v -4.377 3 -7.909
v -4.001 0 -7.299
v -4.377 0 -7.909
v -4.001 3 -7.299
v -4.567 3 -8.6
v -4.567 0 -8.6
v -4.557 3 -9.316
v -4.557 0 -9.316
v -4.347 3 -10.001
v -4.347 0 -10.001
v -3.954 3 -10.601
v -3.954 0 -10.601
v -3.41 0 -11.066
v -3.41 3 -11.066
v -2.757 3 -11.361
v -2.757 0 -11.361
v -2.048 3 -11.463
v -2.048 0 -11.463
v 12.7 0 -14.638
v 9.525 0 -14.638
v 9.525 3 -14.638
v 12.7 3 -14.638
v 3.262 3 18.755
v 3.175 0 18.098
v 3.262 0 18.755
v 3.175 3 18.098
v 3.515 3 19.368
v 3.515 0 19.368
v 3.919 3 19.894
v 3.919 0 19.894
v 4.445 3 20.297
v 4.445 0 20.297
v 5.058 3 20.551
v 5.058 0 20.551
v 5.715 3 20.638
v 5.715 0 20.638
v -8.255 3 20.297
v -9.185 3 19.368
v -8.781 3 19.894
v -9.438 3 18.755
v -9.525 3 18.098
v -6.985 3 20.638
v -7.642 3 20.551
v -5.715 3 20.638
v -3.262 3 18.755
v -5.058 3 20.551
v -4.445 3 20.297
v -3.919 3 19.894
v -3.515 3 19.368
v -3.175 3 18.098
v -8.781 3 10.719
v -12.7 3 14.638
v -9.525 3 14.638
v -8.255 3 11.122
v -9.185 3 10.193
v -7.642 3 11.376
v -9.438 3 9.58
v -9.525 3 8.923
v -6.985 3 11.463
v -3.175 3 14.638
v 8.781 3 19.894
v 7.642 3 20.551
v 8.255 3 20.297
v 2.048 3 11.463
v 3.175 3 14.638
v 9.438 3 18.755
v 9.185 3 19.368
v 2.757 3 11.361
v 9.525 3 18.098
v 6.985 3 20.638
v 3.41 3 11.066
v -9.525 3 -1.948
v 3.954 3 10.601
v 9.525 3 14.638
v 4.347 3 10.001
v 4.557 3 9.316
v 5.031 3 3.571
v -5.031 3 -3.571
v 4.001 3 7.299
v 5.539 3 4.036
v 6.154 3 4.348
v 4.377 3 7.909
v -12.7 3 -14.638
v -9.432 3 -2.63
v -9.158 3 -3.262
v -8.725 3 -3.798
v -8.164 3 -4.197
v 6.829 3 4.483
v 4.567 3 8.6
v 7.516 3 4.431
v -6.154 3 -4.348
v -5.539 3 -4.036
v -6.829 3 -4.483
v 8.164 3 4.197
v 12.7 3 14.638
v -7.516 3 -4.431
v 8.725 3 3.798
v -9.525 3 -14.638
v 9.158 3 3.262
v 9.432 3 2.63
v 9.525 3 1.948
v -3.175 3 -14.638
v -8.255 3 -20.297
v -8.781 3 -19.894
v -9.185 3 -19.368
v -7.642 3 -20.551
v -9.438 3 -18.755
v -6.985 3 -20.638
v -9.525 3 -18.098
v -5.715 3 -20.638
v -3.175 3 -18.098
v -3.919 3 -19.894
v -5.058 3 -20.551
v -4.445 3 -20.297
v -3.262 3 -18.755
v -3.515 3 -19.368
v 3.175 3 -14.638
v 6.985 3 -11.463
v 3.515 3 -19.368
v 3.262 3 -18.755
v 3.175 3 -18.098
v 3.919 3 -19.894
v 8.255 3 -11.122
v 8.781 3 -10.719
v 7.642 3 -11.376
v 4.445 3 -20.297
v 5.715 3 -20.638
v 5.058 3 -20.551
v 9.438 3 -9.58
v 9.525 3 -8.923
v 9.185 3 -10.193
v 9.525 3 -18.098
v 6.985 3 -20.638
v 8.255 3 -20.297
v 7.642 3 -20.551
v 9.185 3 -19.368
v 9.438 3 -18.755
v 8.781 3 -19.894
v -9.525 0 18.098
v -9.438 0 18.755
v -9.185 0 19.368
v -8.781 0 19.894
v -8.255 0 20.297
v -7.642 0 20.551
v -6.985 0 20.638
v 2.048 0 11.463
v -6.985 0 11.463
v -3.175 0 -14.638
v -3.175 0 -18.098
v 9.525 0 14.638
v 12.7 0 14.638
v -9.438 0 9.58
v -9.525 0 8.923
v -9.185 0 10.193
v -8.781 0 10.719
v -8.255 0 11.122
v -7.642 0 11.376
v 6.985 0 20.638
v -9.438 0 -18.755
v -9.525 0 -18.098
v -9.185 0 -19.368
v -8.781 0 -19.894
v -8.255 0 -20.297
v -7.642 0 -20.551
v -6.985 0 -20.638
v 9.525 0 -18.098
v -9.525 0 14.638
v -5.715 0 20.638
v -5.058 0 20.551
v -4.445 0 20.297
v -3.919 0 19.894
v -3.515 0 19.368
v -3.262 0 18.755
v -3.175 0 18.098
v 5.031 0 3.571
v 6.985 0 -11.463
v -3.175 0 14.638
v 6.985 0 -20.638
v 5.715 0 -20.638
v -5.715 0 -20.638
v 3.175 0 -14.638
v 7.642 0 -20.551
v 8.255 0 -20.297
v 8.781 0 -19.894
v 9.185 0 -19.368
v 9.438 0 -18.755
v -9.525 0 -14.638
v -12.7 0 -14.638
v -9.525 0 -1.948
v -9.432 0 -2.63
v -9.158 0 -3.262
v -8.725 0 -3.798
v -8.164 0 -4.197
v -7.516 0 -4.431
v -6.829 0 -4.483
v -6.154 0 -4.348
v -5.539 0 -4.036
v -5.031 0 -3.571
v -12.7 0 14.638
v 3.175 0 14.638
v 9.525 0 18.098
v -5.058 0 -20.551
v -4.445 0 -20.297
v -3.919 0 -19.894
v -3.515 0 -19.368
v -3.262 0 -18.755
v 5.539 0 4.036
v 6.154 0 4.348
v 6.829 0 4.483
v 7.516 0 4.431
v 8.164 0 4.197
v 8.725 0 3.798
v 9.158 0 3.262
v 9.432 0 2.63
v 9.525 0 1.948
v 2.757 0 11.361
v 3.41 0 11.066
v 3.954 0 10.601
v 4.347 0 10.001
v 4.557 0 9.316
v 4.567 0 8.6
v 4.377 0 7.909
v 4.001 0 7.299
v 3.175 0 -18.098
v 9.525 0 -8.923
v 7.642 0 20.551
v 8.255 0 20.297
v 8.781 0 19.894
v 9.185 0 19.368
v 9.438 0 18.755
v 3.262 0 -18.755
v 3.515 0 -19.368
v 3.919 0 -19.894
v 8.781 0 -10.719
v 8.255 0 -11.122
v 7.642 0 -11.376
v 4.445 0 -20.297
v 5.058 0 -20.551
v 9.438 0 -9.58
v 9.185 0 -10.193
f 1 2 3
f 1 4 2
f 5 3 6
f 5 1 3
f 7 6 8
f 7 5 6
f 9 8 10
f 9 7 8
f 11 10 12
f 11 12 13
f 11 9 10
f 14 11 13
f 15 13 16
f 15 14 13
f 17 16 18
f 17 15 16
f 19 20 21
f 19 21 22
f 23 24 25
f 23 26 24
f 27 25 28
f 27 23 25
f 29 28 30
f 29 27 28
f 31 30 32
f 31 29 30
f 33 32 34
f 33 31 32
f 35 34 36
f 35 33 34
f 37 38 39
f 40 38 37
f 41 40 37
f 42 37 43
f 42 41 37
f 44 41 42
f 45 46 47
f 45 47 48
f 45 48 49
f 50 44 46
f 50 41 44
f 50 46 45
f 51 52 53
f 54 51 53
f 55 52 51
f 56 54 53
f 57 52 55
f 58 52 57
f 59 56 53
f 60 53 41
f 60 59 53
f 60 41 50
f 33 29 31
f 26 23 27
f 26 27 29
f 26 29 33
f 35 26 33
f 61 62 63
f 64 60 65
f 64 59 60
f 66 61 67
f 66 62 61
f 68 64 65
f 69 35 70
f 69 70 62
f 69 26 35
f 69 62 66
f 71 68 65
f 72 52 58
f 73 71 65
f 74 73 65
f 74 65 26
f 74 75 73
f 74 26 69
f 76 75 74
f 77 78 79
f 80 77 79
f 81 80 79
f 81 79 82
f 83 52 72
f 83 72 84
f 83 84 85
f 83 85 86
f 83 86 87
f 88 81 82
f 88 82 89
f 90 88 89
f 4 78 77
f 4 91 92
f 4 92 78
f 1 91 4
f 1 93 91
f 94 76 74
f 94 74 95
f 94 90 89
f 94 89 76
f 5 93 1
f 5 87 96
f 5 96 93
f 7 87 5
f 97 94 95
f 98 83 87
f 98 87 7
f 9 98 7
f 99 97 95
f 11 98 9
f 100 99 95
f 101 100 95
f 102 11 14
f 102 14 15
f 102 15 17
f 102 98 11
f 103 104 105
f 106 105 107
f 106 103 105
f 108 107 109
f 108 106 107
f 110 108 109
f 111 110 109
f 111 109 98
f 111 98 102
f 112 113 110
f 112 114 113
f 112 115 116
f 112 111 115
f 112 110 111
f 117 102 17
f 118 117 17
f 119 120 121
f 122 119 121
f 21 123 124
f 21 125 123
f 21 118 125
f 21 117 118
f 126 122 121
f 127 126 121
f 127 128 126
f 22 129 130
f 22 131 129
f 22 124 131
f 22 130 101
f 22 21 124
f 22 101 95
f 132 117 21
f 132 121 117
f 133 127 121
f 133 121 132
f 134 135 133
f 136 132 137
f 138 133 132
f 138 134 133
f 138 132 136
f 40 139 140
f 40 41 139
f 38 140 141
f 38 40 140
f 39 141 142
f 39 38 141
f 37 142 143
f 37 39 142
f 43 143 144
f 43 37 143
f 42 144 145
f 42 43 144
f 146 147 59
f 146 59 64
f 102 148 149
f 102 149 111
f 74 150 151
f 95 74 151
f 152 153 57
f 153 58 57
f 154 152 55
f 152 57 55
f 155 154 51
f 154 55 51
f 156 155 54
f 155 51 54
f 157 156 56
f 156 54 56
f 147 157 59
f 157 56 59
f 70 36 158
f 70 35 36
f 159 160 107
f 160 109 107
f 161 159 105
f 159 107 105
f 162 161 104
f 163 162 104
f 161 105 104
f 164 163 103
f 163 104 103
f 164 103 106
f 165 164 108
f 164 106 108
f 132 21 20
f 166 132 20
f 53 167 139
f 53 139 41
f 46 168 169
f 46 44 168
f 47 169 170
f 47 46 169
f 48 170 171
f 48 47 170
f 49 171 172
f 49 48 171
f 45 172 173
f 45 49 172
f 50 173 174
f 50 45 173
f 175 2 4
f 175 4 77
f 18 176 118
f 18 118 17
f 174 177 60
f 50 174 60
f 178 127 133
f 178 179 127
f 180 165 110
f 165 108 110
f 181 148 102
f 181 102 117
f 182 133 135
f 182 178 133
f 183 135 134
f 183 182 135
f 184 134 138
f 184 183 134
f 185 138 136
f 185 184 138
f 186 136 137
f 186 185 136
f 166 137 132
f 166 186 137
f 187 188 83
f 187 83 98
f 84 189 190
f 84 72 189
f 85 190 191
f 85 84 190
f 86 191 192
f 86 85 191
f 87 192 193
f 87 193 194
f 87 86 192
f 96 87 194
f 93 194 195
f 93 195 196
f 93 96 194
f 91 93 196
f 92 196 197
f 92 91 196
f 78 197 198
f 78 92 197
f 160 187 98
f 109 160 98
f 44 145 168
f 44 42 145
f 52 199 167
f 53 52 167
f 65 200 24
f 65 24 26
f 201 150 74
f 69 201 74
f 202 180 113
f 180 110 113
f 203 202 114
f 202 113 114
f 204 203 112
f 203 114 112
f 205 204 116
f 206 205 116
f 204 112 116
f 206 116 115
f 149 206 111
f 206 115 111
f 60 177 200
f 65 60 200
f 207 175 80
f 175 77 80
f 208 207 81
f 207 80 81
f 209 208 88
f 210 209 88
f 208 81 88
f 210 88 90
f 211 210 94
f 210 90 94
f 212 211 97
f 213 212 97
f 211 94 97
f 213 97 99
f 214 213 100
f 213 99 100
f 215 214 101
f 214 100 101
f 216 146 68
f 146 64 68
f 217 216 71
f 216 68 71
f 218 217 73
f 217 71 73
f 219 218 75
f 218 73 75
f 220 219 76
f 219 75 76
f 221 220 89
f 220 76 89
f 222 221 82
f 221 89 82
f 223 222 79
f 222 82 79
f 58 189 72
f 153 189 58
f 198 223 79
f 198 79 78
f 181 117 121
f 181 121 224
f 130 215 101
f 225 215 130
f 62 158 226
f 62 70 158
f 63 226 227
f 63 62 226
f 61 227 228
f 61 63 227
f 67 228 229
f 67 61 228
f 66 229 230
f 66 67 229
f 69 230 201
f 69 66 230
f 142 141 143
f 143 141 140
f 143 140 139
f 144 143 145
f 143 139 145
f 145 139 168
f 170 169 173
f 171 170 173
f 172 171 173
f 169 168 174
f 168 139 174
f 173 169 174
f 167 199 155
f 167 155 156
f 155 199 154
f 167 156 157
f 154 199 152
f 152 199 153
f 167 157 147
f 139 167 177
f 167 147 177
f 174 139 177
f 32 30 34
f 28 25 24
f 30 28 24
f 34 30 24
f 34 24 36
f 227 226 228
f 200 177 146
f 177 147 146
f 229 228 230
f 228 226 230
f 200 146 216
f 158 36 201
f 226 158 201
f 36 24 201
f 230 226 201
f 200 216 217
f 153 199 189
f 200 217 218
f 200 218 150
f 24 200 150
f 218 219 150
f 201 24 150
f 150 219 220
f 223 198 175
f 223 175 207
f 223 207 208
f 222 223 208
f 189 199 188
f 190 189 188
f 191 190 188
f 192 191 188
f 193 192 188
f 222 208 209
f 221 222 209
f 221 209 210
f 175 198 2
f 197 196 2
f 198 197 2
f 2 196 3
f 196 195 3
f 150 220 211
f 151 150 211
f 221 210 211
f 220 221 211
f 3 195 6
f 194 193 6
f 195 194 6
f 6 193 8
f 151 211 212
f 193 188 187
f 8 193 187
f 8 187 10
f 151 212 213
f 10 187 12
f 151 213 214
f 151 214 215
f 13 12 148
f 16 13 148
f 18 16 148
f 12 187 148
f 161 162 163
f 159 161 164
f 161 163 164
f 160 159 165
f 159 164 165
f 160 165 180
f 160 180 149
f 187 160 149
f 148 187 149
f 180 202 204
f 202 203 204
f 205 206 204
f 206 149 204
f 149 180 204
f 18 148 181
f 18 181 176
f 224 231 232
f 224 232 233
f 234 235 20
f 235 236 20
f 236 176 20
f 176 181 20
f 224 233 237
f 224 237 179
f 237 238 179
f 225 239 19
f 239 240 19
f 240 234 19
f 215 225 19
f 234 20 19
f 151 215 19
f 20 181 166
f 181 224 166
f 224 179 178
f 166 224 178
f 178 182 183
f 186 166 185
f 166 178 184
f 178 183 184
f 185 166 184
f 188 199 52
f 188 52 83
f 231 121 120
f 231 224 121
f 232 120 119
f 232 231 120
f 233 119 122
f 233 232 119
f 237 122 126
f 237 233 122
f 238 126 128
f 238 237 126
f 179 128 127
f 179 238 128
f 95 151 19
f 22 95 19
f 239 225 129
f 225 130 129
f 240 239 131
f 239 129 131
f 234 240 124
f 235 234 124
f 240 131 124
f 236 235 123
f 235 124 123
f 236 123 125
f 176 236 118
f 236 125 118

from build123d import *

# Parameters (mm, degrees)
SKETCH1_W               = 25.4
SKETCH1_H               = 29.275000124
BOSS_EXTRUDE1_DEPTH     = 3
SKETCH2_W               = 6.35
SKETCH2_H               = 3
BOSS_EXTRUDE2_DEPTH     = 6
LPATTERN1_COUNT         = 2
LPATTERN1_PITCH         = 12.7
MIRROR1_COPY_1_SKETCH_W = 6.35
MIRROR1_COPY_1_SKETCH_H = 3
MIRROR1_COPY_1_DEPTH    = 6
CUT_EXTRUDE1_DEPTH      = 25.417133509
CUT_EXTRUDE1_DEPTH_BACK = 25.417133509
FILLET1_R               = 2.54
FILLET2_R               = 2.54


with BuildPart() as part:
    # Sketch1 → Boss-Extrude1 (new body)
    with BuildSketch(Plane(origin=(0, 0, 0), x_dir=(1, 0, 0), z_dir=(0, 1, 0))):
        Rectangle(SKETCH1_W, SKETCH1_H)
    extrude(amount=BOSS_EXTRUDE1_DEPTH)

    # Sketch2 → Boss-Extrude2 (add)
    with BuildSketch(Plane.XY.offset(14.637500062)):
        with Locations((-6.35, 1.5)):
            Rectangle(SKETCH2_W, SKETCH2_H)
    boss_extrude2 = extrude(amount=BOSS_EXTRUDE2_DEPTH)

    # LPattern1: Boss-Extrude2 ×2
    with Locations(*[(i * LPATTERN1_PITCH, 0, 0) for i in range(1, LPATTERN1_COUNT)]):
        add(boss_extrude2)

    # Mirror1: Boss-Extrude2 across plane
    add(boss_extrude2.mirror(Plane.XY))

    # Mirror1 copy 1 sketch → Mirror1 copy 1 (add)
    with BuildSketch(Plane(origin=(12.7, 0, -14.637500062), x_dir=(1, 0, 0), z_dir=(0, 0, -1))):
        with Locations((-6.35, -1.5)):
            Rectangle(MIRROR1_COPY_1_SKETCH_W, MIRROR1_COPY_1_SKETCH_H)
    extrude(amount=MIRROR1_COPY_1_DEPTH)

    # Sketch4 → Cut-Extrude1 (cut, two sides: drawn at the far end of the back side and taken through both)
    with BuildSketch(Plane(origin=(0, 3, 0), x_dir=(1, 0, 0), z_dir=(0, 1, 0)).offset(-CUT_EXTRUDE1_DEPTH_BACK)):
        Polygon((7.460937373, -11.462500062), (-9.525, 8.978582163), (-9.525, -11.462500062), align=None)
        Polygon((9.525, 11.462500062), (-7.460937373, 11.462500062), (9.525, -8.978582163), align=None)
    extrude(amount=CUT_EXTRUDE1_DEPTH + CUT_EXTRUDE1_DEPTH_BACK, mode=Mode.SUBTRACT)

    # Fillet1
    fillet1_edges = [part.edges().sort_by_distance(p)[0] for p in [
        (-7.460937373, 1.5, -11.462500062),
        (9.525, 1.5, -11.462500062),
        (9.525, 1.5, 8.978582163),
        (-9.525, 1.5, -8.978582163),
        (7.460937373, 1.5, 11.462500062),
        (-9.525, 1.5, 11.462500062),
    ]]
    fillet(fillet1_edges, radius=FILLET1_R)

    # Fillet2
    fillet2_edges = [part.edges().sort_by_distance(p)[0] for p in [
        (-9.525, 1.5, 20.637500062),
        (-3.175, 1.5, 20.637500062),
        (3.175, 1.5, 20.637500062),
        (9.525, 1.5, 20.637500062),
        (-9.525, 1.5, -20.637500062),
        (-3.175, 1.5, -20.637500062),
        (3.175, 1.5, -20.637500062),
        (9.525, 1.5, -20.637500062),
    ]]
    fillet(fillet2_edges, radius=FILLET2_R)


solid = part.part
